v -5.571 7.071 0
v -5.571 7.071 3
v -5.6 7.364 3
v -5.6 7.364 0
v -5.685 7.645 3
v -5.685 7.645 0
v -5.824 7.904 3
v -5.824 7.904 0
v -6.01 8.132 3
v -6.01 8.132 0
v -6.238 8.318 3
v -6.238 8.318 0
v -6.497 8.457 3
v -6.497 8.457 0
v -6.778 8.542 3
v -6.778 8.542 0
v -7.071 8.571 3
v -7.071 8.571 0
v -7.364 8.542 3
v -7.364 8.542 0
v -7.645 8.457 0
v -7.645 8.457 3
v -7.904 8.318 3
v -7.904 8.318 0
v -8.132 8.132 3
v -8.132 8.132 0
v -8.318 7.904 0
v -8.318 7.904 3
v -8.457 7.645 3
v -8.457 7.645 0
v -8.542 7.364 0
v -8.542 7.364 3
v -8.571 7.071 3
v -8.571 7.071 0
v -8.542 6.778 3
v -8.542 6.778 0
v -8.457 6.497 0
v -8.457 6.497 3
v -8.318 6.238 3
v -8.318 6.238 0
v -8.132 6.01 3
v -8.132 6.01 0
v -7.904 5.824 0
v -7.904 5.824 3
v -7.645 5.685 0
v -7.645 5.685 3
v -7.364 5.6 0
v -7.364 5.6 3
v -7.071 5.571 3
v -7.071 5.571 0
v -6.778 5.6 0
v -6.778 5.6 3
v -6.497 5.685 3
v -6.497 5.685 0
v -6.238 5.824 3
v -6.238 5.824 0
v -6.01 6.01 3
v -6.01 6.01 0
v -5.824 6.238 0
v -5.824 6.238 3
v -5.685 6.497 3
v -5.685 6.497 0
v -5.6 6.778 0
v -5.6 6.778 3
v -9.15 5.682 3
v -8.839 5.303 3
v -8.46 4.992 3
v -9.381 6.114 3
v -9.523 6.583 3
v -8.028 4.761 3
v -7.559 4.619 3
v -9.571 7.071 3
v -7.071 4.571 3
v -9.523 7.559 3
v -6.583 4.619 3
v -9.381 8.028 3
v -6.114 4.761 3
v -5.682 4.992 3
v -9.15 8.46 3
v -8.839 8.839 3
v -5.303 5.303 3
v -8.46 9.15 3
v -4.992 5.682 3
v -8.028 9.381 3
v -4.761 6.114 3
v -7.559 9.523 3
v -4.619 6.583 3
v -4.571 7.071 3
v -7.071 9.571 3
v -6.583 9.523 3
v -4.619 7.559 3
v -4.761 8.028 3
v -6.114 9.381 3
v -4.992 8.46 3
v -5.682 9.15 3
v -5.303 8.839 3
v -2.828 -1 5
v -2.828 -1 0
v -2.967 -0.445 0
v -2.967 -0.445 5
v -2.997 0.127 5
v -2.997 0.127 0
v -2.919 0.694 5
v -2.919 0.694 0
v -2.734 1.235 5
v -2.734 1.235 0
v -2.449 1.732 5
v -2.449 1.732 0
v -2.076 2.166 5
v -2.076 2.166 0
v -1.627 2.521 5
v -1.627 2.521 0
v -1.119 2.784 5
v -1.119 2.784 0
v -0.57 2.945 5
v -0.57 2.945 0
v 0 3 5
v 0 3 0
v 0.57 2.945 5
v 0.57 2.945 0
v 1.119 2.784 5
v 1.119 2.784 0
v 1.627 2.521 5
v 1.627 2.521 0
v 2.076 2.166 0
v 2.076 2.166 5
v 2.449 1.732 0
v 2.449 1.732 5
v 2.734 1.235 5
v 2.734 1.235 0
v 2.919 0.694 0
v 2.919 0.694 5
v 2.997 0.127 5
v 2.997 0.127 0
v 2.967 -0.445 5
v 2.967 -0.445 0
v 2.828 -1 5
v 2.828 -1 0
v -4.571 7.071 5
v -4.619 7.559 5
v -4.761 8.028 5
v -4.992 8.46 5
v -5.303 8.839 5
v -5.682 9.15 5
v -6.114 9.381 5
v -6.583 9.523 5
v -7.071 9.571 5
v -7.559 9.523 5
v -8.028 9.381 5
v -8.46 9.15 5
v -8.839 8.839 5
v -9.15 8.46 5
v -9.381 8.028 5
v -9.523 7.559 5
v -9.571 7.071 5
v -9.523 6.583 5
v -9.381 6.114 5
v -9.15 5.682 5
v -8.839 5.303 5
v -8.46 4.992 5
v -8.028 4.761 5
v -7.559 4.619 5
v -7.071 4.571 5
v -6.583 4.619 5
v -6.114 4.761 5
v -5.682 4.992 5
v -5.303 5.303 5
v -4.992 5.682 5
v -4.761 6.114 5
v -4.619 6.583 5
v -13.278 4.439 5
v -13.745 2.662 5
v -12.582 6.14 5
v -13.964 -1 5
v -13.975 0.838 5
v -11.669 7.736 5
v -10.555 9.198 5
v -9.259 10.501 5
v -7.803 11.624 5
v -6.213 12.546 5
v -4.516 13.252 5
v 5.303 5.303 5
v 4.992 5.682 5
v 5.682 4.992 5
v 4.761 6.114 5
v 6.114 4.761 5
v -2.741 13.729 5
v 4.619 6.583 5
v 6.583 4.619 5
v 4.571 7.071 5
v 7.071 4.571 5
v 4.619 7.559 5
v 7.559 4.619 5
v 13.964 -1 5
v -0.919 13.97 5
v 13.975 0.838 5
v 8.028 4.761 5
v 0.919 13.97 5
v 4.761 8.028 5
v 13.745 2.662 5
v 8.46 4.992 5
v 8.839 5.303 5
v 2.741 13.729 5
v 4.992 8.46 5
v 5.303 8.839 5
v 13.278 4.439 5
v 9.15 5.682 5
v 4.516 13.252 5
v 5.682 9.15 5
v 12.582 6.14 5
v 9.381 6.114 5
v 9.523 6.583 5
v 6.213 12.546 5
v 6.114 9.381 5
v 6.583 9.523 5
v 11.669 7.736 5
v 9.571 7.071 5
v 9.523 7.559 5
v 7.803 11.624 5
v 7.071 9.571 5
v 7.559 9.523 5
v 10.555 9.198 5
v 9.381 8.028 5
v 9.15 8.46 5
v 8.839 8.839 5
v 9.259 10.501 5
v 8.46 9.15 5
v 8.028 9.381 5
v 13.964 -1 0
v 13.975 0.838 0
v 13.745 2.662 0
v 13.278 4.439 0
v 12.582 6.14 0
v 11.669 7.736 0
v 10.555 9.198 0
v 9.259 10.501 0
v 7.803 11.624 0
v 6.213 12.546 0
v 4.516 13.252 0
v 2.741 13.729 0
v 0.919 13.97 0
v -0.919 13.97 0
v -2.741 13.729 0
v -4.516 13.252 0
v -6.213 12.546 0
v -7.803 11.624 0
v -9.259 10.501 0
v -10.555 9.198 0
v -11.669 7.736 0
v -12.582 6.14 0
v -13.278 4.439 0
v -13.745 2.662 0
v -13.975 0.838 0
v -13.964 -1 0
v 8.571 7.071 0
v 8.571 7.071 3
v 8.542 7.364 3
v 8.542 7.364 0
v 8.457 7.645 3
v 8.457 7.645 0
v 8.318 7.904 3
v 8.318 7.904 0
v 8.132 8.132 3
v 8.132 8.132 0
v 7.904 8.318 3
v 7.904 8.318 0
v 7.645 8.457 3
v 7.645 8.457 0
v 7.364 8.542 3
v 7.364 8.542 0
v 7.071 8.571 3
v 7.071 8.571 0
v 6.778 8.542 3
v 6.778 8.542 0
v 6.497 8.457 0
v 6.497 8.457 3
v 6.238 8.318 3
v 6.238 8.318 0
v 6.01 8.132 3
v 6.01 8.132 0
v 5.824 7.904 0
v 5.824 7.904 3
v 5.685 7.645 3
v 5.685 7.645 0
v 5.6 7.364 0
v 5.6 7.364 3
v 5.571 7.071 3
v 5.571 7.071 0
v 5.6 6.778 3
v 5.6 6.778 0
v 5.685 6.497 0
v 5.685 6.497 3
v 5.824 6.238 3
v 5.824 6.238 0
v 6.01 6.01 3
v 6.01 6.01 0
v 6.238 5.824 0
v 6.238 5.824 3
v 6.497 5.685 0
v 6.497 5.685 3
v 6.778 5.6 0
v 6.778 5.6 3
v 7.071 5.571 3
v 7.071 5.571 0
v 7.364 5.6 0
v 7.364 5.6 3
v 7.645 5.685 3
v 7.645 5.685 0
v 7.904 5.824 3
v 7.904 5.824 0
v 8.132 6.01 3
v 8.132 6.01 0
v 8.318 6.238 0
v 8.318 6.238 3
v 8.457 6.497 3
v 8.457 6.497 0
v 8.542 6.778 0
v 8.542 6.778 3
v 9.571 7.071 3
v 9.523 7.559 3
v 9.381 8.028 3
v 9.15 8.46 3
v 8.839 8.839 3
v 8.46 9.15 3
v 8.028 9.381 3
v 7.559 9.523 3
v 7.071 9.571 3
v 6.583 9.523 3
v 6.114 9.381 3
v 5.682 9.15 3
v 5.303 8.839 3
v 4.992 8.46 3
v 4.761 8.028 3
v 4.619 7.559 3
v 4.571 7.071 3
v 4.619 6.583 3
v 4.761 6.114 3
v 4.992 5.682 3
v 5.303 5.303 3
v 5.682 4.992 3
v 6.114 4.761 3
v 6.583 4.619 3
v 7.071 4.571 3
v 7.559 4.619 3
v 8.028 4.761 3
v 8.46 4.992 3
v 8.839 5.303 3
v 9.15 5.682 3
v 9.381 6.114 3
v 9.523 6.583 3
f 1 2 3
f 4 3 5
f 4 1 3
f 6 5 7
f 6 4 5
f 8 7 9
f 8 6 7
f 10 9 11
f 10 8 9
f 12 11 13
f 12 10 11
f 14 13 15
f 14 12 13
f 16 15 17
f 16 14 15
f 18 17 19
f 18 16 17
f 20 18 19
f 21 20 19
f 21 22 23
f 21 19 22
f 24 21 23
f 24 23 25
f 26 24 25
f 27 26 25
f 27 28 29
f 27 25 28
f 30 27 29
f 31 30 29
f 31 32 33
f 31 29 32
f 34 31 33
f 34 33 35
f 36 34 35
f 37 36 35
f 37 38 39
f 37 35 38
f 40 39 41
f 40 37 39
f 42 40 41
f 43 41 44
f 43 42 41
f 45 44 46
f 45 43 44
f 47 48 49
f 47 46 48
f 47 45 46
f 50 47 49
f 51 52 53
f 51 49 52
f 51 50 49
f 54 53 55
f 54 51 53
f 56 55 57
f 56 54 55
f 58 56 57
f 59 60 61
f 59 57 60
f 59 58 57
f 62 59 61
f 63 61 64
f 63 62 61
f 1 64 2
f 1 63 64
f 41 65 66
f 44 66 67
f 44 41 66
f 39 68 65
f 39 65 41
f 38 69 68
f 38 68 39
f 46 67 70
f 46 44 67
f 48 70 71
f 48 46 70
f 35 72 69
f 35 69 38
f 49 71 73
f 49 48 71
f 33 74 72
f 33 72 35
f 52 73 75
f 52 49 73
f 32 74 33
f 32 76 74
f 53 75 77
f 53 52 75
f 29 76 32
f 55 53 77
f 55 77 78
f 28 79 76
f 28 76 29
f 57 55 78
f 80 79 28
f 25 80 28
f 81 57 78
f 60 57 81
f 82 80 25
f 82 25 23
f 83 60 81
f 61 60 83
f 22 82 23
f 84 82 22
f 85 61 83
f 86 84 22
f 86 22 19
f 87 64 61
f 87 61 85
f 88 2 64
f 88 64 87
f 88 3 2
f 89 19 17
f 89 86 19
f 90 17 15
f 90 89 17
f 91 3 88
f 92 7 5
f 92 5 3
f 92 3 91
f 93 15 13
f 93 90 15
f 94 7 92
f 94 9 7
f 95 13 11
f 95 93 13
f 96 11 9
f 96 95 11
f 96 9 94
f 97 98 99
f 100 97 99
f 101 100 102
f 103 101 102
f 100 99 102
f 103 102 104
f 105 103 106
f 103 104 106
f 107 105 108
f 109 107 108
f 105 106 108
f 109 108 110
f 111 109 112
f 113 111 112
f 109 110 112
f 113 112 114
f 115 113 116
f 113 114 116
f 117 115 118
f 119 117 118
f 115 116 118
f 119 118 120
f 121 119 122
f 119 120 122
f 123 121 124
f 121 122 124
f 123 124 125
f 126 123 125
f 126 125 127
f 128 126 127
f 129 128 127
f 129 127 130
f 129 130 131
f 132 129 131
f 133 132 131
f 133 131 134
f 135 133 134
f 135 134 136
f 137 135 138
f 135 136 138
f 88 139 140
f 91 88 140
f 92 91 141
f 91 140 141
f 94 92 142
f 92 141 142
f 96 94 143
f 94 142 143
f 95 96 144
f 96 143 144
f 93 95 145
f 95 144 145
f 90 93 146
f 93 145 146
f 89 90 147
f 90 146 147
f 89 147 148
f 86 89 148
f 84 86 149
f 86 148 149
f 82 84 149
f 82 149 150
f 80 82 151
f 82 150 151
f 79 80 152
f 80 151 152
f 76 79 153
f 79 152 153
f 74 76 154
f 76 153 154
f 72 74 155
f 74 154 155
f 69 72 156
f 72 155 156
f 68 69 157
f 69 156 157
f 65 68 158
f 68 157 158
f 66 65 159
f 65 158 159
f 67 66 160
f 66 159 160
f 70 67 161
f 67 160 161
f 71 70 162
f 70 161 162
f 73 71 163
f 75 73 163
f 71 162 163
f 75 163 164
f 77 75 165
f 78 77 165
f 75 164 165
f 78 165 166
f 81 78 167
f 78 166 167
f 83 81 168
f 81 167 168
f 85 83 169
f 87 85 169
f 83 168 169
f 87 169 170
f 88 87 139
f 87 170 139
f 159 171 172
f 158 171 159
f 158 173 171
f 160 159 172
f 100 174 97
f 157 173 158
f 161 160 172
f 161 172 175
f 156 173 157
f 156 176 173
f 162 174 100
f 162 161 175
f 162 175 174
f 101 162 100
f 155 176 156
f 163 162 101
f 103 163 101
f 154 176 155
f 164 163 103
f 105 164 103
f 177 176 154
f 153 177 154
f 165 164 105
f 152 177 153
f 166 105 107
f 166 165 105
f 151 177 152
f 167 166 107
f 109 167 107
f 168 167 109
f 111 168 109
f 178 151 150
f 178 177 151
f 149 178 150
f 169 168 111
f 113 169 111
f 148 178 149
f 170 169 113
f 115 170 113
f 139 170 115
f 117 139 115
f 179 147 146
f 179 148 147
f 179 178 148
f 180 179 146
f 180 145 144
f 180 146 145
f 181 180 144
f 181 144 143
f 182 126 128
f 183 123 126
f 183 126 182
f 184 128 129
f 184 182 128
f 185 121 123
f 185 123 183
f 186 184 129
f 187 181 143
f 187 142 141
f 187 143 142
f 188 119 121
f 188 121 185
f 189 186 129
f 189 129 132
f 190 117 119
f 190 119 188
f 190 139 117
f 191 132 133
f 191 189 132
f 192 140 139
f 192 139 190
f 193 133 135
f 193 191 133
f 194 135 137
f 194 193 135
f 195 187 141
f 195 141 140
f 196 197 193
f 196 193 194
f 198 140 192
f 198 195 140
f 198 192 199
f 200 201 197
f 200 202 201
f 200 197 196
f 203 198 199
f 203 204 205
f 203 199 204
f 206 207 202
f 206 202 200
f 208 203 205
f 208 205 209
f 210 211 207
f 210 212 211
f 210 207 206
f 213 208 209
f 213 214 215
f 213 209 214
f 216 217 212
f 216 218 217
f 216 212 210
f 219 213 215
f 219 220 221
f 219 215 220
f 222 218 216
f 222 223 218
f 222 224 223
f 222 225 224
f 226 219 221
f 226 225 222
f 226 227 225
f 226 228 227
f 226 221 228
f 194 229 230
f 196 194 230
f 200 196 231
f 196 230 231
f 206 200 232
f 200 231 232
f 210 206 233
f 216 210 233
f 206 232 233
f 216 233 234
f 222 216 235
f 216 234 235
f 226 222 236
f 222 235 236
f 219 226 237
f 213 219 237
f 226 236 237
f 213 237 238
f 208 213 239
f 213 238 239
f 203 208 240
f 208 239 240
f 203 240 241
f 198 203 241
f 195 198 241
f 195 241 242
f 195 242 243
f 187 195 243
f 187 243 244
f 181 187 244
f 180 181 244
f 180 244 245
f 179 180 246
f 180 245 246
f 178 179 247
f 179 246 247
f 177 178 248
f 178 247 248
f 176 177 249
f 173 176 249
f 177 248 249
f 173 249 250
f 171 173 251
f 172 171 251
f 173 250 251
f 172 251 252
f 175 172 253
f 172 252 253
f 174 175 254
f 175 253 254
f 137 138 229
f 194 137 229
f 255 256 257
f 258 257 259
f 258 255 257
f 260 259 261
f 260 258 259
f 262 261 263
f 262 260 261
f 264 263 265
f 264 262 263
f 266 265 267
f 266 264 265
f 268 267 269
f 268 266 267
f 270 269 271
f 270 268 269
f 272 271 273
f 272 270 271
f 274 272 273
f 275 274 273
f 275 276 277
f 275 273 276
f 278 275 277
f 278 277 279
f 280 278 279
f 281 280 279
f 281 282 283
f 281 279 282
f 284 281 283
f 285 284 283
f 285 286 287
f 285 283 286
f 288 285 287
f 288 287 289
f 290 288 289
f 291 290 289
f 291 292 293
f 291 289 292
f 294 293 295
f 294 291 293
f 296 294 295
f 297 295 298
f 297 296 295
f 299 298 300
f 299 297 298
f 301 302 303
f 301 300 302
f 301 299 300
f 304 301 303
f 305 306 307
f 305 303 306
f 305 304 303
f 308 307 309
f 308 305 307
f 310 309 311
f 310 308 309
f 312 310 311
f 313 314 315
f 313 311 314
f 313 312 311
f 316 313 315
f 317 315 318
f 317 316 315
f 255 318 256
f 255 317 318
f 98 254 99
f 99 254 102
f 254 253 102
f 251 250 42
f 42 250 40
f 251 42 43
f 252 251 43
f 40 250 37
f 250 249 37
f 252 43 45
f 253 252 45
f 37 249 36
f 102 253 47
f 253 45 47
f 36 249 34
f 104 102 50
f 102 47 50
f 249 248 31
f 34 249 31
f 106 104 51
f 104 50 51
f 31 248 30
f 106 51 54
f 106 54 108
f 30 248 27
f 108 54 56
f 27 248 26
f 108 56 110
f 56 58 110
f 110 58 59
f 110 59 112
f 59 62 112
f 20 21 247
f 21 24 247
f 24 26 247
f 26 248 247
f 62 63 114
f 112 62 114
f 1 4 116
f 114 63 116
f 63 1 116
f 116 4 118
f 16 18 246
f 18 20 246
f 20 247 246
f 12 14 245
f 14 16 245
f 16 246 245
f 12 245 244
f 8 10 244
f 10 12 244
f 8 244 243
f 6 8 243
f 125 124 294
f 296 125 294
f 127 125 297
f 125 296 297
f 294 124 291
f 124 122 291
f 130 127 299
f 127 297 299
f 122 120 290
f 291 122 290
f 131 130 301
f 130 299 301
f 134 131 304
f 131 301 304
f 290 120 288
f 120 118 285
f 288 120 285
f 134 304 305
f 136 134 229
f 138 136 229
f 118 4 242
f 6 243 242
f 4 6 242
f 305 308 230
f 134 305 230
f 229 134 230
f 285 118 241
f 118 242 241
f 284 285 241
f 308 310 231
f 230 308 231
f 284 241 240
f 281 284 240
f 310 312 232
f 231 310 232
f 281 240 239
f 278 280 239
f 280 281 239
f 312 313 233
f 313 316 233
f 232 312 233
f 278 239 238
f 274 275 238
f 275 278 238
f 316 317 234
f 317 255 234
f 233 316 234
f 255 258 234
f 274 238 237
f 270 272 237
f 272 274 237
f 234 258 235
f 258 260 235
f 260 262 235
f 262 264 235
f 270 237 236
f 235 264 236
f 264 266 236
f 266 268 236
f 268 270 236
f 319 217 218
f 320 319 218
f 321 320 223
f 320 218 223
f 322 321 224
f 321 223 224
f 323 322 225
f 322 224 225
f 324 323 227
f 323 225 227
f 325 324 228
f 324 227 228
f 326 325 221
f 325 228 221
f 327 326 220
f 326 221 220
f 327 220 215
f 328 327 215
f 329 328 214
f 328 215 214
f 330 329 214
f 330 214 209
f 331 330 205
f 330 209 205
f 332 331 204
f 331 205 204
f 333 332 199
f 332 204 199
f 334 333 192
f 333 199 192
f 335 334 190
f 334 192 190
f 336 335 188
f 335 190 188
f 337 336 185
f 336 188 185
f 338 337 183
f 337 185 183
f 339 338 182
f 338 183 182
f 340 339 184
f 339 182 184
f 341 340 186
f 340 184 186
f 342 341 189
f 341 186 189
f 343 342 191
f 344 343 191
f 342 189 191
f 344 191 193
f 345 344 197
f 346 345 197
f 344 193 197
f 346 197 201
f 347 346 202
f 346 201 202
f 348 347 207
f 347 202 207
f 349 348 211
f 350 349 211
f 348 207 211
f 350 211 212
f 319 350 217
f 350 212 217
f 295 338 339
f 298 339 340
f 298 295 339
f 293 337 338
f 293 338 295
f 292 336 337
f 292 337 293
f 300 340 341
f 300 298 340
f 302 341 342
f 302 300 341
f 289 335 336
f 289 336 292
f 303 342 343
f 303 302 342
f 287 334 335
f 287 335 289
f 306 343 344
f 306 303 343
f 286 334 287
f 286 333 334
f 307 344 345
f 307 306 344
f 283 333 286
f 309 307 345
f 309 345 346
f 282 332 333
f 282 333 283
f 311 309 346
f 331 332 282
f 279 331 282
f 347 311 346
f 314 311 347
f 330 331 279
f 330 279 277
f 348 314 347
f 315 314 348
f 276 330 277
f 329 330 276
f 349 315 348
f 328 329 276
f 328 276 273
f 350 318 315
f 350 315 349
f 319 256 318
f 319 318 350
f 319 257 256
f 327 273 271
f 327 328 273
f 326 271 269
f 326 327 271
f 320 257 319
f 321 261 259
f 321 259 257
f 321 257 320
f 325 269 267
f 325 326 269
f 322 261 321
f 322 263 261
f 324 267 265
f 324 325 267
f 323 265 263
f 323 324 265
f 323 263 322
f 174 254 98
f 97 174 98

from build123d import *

# Parameters (mm, degrees)
ESQUISSE1_R      = 1.5
EXTRUSION1_DEPTH = 5
ESQUISSE2_R      = 2.5
EXTRUSION2_DEPTH = 2


with BuildPart() as part:
    # Esquisse1 → Extrusion1 (new body)
    with BuildSketch(Plane.XY):
        with BuildLine():
            Line((-13.964240044, -1), (-2.828427125, -1))
            ThreePointArc((-2.828427125, -1), (0, 3), (2.828427125, -1))
            Line((2.828427125, -1), (13.964240044, -1))
            ThreePointArc((13.964240044, -1), (0, 14), (-13.964240044, -1))
        make_face()
        with Locations((-7.071067812, 7.071067812)):
            Circle(ESQUISSE1_R, mode=Mode.SUBTRACT)
        with Locations((7.071067812, 7.071067812)):
            Circle(ESQUISSE1_R, mode=Mode.SUBTRACT)
    extrude(amount=EXTRUSION1_DEPTH)

    # Esquisse2 → Extrusion2 (cut)
    with BuildSketch(Plane.XY.offset(5)):
        with Locations((-7.071067812, 7.071067812)):
            Circle(ESQUISSE2_R)
        with Locations((7.071067812, 7.071067812)):
            Circle(ESQUISSE2_R)
    extrude(amount=-EXTRUSION2_DEPTH, mode=Mode.SUBTRACT)


solid = part.part
